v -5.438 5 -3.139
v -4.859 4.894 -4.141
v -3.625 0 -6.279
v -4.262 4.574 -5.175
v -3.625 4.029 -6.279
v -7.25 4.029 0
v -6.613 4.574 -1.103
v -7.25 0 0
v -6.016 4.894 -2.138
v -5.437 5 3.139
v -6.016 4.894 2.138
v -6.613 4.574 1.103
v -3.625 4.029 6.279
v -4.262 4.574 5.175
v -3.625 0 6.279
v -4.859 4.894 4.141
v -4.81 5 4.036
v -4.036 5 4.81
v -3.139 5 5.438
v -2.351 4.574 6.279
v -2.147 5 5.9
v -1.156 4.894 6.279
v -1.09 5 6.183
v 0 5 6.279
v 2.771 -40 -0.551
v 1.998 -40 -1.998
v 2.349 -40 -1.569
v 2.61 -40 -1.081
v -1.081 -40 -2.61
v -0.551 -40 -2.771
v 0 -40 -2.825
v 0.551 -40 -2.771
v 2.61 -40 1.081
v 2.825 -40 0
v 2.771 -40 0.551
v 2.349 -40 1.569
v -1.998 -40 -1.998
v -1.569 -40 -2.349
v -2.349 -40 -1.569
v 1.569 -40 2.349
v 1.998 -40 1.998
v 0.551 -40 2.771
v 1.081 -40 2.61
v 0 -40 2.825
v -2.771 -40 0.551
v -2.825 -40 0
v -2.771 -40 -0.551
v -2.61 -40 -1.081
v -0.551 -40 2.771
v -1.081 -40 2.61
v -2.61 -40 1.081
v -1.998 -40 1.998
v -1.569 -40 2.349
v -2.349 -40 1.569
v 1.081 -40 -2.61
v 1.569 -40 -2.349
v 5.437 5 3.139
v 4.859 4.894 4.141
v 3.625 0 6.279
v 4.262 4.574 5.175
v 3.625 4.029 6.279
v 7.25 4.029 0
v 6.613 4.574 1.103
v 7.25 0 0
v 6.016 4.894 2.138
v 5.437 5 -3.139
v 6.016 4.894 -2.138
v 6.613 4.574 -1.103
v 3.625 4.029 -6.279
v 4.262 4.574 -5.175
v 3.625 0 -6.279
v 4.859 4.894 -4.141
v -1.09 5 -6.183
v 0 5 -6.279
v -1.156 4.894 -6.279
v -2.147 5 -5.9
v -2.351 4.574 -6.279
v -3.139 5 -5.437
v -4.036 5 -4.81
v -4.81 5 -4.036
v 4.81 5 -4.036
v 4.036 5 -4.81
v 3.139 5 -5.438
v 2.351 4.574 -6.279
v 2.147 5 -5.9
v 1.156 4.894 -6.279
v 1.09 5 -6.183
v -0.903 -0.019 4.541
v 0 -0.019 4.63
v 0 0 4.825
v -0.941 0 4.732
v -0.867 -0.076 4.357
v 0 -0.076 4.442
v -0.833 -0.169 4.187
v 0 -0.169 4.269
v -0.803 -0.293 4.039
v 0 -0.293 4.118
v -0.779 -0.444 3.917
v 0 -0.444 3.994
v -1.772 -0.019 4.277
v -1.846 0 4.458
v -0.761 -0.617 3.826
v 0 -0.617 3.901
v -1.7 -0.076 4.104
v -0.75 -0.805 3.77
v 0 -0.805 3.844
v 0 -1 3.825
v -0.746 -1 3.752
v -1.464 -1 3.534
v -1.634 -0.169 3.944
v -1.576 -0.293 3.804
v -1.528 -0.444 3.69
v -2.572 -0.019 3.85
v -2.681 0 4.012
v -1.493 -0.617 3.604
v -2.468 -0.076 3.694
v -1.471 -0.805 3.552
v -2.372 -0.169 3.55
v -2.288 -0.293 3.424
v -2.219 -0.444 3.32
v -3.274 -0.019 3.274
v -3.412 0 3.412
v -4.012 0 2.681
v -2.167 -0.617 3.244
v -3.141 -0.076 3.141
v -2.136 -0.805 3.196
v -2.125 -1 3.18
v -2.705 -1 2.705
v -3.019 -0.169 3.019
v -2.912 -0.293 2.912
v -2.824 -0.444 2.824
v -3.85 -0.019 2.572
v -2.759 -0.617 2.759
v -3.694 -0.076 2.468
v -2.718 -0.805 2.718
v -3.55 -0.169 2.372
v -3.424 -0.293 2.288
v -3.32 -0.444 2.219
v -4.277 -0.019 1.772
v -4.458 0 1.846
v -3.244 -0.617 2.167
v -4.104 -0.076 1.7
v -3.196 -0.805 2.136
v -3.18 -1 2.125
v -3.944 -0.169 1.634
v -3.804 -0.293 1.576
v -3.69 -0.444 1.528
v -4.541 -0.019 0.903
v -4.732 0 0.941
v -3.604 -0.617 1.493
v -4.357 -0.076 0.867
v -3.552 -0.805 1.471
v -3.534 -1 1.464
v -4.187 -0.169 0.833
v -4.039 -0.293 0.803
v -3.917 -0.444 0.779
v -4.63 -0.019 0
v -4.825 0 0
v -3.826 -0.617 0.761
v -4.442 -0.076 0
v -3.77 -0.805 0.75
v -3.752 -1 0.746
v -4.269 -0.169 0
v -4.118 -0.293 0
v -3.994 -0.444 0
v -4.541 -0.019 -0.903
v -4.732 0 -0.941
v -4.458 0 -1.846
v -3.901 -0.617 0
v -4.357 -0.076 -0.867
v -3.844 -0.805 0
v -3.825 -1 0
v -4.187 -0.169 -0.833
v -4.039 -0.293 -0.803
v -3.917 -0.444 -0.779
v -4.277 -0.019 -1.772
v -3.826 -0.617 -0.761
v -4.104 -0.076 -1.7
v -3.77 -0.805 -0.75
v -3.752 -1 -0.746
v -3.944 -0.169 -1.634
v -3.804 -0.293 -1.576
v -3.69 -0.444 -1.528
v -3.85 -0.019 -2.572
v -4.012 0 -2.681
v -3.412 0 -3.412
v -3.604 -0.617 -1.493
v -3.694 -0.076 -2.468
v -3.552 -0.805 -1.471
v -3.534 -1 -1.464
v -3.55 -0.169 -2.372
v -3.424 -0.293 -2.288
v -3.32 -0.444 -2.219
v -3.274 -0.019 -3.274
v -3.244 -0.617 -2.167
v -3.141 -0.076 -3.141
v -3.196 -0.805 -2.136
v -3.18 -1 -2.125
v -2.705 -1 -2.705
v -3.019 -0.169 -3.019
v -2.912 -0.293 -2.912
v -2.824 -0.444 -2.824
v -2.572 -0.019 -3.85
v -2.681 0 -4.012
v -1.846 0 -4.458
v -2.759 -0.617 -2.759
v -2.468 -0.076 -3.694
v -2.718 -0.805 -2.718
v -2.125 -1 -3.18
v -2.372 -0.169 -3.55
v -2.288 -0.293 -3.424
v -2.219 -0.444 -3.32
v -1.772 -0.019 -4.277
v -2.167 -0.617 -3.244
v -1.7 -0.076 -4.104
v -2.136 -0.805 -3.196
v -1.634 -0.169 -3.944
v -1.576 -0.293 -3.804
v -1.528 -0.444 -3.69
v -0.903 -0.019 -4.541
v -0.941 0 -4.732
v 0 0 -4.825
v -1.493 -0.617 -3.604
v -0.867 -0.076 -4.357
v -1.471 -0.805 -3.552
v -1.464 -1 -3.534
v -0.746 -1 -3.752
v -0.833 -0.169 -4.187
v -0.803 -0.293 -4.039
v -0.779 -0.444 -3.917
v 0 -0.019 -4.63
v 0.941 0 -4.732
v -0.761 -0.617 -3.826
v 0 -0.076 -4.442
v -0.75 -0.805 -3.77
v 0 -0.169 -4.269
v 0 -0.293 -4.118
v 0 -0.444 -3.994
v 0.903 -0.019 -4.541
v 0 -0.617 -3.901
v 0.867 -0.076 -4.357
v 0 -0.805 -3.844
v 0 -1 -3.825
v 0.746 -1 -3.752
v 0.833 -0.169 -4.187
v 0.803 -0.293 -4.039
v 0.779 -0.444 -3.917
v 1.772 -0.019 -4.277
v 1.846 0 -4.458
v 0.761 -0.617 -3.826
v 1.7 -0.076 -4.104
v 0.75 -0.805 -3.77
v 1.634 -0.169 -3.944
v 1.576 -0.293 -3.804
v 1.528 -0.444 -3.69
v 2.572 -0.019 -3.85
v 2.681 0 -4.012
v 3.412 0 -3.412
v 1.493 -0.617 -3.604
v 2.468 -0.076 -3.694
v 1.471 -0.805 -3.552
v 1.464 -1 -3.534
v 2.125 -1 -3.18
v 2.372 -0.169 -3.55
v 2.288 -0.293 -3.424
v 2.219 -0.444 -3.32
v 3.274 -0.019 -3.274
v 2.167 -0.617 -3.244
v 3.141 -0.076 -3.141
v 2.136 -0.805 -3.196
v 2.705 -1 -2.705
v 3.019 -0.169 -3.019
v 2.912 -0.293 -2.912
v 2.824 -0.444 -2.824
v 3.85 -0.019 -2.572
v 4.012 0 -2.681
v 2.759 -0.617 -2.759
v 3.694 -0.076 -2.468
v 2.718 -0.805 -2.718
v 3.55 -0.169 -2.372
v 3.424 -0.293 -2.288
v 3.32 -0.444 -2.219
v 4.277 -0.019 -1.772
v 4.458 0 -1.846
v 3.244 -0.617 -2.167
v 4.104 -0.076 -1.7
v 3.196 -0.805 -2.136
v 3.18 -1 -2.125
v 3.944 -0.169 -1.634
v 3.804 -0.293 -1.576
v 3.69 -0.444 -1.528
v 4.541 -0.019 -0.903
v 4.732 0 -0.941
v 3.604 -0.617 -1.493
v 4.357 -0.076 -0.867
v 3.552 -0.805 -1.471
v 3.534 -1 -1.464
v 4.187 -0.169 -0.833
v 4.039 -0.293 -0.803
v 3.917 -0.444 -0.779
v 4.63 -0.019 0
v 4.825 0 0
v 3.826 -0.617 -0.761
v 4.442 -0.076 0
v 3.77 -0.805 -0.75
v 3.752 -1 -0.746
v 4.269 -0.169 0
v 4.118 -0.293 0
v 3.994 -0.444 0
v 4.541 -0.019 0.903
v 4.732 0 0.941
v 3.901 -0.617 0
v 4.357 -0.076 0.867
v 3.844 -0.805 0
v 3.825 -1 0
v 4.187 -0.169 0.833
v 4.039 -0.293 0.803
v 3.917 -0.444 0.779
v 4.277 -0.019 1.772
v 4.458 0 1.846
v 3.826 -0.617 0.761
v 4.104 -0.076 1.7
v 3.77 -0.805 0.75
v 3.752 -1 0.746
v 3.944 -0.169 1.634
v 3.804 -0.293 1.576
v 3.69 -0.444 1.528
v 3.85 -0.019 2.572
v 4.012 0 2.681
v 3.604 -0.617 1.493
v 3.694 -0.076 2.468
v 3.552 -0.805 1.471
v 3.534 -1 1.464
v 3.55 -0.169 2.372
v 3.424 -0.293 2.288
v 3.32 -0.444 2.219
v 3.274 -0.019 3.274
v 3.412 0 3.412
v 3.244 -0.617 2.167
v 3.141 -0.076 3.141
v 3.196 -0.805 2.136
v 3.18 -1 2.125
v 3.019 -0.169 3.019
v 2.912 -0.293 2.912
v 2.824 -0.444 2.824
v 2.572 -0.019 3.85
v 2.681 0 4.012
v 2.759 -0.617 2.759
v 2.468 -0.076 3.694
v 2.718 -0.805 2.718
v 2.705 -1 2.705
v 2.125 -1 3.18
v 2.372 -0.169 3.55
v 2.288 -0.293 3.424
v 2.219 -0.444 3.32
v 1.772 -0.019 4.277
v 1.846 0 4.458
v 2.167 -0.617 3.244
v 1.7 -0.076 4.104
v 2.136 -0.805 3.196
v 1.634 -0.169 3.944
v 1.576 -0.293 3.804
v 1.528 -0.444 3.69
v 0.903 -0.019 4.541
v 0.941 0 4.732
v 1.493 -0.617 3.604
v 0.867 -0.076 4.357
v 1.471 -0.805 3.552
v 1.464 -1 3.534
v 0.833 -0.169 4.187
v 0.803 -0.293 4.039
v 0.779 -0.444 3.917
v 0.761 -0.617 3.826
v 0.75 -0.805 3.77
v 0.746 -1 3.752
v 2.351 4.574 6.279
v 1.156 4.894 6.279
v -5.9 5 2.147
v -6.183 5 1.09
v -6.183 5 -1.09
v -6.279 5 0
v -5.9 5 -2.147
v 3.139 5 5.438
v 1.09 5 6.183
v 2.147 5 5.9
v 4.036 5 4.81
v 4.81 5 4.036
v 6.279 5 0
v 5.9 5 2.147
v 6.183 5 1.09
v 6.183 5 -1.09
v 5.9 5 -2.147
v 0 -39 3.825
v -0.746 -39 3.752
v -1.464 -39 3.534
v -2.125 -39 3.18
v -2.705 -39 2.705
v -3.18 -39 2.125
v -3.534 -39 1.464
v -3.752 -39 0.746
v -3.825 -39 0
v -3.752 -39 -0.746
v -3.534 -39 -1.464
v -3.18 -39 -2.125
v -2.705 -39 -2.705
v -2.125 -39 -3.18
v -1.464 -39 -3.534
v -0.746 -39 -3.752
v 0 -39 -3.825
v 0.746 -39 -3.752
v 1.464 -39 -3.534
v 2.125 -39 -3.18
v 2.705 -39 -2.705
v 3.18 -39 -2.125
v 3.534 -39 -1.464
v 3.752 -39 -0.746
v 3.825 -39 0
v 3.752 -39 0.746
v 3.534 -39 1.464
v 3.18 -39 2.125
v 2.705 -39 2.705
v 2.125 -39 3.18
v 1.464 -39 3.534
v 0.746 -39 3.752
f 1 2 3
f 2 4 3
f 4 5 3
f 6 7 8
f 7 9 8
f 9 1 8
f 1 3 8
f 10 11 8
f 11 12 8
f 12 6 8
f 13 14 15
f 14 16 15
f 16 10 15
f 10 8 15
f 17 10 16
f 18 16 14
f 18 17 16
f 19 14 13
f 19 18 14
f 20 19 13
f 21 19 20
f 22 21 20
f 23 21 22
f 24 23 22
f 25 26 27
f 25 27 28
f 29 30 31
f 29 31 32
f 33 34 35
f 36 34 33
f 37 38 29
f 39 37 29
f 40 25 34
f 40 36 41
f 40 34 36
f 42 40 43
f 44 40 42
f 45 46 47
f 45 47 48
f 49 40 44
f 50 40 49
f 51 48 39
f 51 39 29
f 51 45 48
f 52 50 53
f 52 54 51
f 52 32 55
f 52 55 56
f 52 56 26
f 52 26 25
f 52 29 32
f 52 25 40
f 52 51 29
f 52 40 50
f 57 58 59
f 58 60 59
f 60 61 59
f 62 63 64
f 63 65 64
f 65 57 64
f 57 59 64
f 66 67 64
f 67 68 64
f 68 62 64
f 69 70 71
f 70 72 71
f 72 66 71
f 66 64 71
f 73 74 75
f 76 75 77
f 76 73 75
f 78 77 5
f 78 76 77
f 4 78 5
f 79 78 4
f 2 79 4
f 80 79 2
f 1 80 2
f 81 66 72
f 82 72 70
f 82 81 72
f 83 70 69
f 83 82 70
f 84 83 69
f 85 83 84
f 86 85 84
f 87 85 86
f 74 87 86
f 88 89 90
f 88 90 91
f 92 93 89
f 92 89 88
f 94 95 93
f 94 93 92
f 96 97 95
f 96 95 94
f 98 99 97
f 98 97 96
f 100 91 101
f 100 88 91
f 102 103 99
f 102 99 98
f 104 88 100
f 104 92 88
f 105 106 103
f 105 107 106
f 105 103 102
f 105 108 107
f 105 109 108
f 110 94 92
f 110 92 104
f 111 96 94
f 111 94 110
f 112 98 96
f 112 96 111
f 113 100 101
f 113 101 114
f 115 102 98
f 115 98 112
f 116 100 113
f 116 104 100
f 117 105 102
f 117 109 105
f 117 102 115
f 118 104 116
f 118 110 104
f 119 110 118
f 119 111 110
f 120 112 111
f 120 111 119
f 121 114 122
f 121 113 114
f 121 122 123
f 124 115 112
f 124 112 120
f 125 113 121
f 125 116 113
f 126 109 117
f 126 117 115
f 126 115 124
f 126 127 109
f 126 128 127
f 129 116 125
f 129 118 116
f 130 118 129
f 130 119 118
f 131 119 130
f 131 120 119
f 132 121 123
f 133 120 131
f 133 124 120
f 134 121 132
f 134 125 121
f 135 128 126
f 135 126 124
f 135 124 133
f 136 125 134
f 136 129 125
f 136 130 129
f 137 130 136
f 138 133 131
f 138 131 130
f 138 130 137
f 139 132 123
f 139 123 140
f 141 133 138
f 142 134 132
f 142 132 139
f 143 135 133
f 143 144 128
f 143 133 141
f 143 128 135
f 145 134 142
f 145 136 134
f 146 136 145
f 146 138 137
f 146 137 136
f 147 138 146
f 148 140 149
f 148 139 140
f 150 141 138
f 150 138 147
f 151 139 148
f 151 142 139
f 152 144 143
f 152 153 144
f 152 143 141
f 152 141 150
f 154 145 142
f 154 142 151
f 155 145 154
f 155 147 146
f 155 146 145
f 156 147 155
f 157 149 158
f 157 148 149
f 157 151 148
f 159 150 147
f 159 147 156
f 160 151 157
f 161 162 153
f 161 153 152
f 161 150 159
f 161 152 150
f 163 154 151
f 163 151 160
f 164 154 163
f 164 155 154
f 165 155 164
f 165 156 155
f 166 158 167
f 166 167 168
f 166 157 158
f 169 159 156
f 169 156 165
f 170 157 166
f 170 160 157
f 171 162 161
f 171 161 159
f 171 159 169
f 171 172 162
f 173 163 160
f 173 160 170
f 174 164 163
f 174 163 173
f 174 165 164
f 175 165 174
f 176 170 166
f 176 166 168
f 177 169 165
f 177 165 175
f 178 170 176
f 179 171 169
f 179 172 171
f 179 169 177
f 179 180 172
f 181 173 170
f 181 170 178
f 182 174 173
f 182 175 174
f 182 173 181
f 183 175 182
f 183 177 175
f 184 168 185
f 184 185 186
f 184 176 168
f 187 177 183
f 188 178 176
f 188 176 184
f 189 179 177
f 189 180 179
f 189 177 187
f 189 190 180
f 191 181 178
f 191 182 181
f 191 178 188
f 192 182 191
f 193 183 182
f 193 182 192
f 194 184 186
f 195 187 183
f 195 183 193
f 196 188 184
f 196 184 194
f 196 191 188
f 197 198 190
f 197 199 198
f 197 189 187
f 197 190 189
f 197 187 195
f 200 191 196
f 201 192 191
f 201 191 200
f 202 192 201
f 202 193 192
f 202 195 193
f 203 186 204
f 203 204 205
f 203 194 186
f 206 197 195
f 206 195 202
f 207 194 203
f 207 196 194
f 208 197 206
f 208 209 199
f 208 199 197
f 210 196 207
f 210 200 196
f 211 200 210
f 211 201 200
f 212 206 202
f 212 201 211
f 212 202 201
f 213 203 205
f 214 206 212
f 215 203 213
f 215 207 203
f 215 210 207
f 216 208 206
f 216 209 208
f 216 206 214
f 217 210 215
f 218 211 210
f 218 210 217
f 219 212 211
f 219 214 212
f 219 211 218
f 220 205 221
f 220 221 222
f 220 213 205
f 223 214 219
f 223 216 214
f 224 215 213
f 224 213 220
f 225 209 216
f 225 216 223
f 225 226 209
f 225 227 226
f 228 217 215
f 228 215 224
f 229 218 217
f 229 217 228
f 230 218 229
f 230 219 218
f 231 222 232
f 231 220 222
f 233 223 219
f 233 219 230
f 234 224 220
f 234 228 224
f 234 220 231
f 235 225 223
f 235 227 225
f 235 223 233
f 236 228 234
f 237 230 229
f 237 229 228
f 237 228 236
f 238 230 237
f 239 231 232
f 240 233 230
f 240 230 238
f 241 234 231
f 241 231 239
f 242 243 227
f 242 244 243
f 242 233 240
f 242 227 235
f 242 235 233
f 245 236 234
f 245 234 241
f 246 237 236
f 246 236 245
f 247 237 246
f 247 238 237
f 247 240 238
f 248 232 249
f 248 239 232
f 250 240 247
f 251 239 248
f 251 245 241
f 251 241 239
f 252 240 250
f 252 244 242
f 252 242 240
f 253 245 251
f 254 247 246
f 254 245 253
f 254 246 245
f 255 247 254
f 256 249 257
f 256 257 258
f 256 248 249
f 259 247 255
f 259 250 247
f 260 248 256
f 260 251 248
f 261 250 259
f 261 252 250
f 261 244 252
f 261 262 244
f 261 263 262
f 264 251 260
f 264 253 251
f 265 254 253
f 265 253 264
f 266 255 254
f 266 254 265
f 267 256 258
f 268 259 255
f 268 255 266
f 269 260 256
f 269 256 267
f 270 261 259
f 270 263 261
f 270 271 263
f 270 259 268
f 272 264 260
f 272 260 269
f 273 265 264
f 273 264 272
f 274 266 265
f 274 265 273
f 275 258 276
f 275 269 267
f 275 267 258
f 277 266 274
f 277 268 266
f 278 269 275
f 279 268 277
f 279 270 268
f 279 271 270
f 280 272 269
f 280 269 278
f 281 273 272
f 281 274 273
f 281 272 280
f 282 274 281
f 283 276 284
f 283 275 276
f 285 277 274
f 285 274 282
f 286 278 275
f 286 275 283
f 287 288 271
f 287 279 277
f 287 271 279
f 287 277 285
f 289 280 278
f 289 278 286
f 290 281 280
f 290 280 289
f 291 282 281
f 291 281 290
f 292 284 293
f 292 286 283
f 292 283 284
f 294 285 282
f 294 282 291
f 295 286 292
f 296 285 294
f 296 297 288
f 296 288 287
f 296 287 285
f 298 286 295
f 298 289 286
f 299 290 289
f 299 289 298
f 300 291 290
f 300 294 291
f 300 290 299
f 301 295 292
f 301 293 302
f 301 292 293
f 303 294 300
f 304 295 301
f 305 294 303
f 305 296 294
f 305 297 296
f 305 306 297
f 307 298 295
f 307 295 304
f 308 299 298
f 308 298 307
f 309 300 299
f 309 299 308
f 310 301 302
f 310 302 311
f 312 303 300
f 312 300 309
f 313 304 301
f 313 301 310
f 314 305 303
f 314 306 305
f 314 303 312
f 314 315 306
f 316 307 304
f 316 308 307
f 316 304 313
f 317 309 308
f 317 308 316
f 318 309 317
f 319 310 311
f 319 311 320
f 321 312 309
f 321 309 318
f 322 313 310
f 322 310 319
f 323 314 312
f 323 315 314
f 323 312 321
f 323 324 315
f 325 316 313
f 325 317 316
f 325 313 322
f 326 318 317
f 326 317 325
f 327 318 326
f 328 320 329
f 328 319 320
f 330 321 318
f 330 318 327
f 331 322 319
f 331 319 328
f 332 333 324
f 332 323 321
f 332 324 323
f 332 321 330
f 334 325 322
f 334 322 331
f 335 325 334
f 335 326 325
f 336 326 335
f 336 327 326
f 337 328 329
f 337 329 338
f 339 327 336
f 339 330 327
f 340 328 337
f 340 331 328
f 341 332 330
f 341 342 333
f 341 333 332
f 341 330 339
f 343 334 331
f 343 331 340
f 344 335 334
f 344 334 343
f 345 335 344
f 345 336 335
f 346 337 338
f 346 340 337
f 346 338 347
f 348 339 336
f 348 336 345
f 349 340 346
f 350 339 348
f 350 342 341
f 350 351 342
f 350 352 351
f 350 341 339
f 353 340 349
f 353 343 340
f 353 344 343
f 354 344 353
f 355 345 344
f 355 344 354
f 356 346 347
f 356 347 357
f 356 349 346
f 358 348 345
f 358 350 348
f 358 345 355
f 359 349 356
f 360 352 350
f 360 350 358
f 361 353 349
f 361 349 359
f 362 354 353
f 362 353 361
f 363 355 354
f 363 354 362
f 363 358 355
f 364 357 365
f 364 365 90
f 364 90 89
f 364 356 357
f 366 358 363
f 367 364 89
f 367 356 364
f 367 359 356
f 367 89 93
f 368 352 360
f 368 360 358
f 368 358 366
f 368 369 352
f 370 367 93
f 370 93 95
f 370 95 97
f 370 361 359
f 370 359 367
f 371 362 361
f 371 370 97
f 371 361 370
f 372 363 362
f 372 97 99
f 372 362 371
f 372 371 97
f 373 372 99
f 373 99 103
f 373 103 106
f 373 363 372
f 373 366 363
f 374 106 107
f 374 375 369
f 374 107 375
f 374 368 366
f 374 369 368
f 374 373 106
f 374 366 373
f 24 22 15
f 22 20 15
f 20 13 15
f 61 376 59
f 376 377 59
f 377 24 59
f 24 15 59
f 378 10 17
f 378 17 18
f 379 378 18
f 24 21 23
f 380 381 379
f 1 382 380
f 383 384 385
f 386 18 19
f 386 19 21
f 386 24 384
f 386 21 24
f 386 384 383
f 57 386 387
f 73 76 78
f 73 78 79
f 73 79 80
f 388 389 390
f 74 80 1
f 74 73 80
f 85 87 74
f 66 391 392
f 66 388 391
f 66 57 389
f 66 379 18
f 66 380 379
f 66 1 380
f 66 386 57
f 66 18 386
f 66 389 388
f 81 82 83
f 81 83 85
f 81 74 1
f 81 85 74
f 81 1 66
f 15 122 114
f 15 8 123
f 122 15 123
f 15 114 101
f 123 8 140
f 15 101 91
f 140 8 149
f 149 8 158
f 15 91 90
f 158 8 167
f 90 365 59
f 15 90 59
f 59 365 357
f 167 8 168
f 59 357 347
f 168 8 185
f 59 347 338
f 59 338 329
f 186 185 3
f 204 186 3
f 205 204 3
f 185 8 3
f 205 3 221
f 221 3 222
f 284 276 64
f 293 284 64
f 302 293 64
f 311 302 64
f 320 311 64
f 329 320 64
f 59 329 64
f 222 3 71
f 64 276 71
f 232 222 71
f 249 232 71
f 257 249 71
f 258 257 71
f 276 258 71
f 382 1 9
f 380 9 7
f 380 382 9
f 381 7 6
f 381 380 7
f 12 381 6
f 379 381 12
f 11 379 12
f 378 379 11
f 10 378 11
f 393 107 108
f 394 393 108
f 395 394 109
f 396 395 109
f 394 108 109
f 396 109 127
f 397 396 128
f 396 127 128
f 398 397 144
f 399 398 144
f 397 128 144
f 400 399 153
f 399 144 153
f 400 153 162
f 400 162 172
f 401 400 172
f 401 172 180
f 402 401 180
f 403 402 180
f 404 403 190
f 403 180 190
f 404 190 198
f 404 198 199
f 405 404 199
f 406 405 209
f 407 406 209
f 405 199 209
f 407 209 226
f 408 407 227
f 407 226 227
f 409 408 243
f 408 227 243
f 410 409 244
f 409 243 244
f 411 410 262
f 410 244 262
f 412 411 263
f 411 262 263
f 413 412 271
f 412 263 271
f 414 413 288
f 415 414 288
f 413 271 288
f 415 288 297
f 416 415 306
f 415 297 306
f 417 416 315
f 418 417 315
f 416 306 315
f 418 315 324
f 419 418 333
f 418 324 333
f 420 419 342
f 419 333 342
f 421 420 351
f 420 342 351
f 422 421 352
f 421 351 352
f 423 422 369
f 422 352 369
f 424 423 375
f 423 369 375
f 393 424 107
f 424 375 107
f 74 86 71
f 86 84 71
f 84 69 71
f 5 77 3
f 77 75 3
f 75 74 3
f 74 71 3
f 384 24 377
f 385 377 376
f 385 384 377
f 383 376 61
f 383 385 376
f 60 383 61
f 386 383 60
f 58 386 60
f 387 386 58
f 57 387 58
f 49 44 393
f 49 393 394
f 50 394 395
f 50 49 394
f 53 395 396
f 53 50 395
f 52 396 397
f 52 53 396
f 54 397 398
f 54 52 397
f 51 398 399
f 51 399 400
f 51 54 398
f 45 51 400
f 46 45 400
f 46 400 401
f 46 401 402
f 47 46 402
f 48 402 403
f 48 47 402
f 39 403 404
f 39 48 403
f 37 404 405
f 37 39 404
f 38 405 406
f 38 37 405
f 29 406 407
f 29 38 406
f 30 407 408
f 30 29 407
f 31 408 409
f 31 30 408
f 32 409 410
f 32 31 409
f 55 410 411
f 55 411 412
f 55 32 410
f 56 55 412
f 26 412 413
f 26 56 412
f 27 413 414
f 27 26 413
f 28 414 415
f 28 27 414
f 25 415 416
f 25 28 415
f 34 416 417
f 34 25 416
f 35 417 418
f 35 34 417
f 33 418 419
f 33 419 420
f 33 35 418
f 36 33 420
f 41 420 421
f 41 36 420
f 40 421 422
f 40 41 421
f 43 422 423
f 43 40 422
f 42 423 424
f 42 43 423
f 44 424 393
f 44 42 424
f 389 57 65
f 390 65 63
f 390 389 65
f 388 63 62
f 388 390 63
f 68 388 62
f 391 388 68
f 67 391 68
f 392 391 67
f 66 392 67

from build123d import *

# Parameters (mm, degrees)
EXTRUDE_1_DEPTH     = 5
SKETCH_8_OUTSIDE_W  = 22.464
SKETCH_8_OUTSIDE_H  = 20.522
SKETCH_8_OUTSIDE_R  = 6.278684177
CUT_EXTRUDE_1_DEPTH = 1
CUT_EXTRUDE_1_DRAFT = -45
SKETCH_9_R          = 3.825
BOLT_LENGTH_DEPTH   = 40
FILLET_1_R          = 1
CHAMFER_1_SIZE      = 1


with BuildPart() as part:
    # Эскиз6 → Бобышка-Вытянуть1 (new body)
    with BuildSketch(Plane(origin=(0, 0, 0), x_dir=(1, 0, 0), z_dir=(0, 1, 0))):
        Polygon((7.25, 0), (3.625, 6.278684177), (-3.625, 6.278684177), (-7.25, 0), (-3.625, -6.278684177), (3.625, -6.278684177), align=None)
    extrude(amount=EXTRUDE_1_DEPTH)


with BuildPart() as cut_extrude_1_tool:
    # Эскиз8 outside → Вырез-Вытянуть1 (with draft: the straight prism first)
    with BuildSketch(Plane(origin=(0, 5, 0), x_dir=(1, 0, 0), z_dir=(0, 1, 0))):
        Rectangle(SKETCH_8_OUTSIDE_W, SKETCH_8_OUTSIDE_H)
        Circle(SKETCH_8_OUTSIDE_R, mode=Mode.SUBTRACT)
    extrude(amount=-CUT_EXTRUDE_1_DEPTH)
    # Вырез-Вытянуть1: the draft: its side faces are tilted about the plane it starts from
    cut_extrude_1_sides = [cut_extrude_1_tool.faces().sort_by_distance(p)[0] for p in [
        (0, 4.5, 10.261),
        (11.232, 4.5, 0),
        (0, 4.5, -10.261),
        (-11.232, 4.5, 0),
        (-6.278684177, 4.5, 0),
    ]]
    draft(cut_extrude_1_sides, Plane(origin=(0, 5, 0), x_dir=(1, 0, 0), z_dir=(0, 1, 0)), CUT_EXTRUDE_1_DRAFT)


with BuildPart() as part_1:
    add(part.part)

    # Вырез-Вытянуть1: cut by cut_extrude_1_tool
    add(cut_extrude_1_tool.part, mode=Mode.SUBTRACT)

    # Эскиз9 → bolt length (add)
    with BuildSketch(Plane.XZ):
        with Locations(Location((0, 0, 0), (0, 0, 90))):  # turned: the seam where the file's is
            Circle(SKETCH_9_R)
    extrude(amount=BOLT_LENGTH_DEPTH)

    # Скругление1
    fillet_1_edges = [part_1.edges().sort_by_distance(p)[0] for p in [
        (0, 0, -3.825),
    ]]
    fillet(fillet_1_edges, radius=FILLET_1_R)

    # Фаска1
    chamfer_1_edges = [part_1.edges().sort_by_distance(p)[0] for p in [
        (0, -40, -3.825),
    ]]
    chamfer(chamfer_1_edges, length=CHAMFER_1_SIZE)


solid = part_1.part
